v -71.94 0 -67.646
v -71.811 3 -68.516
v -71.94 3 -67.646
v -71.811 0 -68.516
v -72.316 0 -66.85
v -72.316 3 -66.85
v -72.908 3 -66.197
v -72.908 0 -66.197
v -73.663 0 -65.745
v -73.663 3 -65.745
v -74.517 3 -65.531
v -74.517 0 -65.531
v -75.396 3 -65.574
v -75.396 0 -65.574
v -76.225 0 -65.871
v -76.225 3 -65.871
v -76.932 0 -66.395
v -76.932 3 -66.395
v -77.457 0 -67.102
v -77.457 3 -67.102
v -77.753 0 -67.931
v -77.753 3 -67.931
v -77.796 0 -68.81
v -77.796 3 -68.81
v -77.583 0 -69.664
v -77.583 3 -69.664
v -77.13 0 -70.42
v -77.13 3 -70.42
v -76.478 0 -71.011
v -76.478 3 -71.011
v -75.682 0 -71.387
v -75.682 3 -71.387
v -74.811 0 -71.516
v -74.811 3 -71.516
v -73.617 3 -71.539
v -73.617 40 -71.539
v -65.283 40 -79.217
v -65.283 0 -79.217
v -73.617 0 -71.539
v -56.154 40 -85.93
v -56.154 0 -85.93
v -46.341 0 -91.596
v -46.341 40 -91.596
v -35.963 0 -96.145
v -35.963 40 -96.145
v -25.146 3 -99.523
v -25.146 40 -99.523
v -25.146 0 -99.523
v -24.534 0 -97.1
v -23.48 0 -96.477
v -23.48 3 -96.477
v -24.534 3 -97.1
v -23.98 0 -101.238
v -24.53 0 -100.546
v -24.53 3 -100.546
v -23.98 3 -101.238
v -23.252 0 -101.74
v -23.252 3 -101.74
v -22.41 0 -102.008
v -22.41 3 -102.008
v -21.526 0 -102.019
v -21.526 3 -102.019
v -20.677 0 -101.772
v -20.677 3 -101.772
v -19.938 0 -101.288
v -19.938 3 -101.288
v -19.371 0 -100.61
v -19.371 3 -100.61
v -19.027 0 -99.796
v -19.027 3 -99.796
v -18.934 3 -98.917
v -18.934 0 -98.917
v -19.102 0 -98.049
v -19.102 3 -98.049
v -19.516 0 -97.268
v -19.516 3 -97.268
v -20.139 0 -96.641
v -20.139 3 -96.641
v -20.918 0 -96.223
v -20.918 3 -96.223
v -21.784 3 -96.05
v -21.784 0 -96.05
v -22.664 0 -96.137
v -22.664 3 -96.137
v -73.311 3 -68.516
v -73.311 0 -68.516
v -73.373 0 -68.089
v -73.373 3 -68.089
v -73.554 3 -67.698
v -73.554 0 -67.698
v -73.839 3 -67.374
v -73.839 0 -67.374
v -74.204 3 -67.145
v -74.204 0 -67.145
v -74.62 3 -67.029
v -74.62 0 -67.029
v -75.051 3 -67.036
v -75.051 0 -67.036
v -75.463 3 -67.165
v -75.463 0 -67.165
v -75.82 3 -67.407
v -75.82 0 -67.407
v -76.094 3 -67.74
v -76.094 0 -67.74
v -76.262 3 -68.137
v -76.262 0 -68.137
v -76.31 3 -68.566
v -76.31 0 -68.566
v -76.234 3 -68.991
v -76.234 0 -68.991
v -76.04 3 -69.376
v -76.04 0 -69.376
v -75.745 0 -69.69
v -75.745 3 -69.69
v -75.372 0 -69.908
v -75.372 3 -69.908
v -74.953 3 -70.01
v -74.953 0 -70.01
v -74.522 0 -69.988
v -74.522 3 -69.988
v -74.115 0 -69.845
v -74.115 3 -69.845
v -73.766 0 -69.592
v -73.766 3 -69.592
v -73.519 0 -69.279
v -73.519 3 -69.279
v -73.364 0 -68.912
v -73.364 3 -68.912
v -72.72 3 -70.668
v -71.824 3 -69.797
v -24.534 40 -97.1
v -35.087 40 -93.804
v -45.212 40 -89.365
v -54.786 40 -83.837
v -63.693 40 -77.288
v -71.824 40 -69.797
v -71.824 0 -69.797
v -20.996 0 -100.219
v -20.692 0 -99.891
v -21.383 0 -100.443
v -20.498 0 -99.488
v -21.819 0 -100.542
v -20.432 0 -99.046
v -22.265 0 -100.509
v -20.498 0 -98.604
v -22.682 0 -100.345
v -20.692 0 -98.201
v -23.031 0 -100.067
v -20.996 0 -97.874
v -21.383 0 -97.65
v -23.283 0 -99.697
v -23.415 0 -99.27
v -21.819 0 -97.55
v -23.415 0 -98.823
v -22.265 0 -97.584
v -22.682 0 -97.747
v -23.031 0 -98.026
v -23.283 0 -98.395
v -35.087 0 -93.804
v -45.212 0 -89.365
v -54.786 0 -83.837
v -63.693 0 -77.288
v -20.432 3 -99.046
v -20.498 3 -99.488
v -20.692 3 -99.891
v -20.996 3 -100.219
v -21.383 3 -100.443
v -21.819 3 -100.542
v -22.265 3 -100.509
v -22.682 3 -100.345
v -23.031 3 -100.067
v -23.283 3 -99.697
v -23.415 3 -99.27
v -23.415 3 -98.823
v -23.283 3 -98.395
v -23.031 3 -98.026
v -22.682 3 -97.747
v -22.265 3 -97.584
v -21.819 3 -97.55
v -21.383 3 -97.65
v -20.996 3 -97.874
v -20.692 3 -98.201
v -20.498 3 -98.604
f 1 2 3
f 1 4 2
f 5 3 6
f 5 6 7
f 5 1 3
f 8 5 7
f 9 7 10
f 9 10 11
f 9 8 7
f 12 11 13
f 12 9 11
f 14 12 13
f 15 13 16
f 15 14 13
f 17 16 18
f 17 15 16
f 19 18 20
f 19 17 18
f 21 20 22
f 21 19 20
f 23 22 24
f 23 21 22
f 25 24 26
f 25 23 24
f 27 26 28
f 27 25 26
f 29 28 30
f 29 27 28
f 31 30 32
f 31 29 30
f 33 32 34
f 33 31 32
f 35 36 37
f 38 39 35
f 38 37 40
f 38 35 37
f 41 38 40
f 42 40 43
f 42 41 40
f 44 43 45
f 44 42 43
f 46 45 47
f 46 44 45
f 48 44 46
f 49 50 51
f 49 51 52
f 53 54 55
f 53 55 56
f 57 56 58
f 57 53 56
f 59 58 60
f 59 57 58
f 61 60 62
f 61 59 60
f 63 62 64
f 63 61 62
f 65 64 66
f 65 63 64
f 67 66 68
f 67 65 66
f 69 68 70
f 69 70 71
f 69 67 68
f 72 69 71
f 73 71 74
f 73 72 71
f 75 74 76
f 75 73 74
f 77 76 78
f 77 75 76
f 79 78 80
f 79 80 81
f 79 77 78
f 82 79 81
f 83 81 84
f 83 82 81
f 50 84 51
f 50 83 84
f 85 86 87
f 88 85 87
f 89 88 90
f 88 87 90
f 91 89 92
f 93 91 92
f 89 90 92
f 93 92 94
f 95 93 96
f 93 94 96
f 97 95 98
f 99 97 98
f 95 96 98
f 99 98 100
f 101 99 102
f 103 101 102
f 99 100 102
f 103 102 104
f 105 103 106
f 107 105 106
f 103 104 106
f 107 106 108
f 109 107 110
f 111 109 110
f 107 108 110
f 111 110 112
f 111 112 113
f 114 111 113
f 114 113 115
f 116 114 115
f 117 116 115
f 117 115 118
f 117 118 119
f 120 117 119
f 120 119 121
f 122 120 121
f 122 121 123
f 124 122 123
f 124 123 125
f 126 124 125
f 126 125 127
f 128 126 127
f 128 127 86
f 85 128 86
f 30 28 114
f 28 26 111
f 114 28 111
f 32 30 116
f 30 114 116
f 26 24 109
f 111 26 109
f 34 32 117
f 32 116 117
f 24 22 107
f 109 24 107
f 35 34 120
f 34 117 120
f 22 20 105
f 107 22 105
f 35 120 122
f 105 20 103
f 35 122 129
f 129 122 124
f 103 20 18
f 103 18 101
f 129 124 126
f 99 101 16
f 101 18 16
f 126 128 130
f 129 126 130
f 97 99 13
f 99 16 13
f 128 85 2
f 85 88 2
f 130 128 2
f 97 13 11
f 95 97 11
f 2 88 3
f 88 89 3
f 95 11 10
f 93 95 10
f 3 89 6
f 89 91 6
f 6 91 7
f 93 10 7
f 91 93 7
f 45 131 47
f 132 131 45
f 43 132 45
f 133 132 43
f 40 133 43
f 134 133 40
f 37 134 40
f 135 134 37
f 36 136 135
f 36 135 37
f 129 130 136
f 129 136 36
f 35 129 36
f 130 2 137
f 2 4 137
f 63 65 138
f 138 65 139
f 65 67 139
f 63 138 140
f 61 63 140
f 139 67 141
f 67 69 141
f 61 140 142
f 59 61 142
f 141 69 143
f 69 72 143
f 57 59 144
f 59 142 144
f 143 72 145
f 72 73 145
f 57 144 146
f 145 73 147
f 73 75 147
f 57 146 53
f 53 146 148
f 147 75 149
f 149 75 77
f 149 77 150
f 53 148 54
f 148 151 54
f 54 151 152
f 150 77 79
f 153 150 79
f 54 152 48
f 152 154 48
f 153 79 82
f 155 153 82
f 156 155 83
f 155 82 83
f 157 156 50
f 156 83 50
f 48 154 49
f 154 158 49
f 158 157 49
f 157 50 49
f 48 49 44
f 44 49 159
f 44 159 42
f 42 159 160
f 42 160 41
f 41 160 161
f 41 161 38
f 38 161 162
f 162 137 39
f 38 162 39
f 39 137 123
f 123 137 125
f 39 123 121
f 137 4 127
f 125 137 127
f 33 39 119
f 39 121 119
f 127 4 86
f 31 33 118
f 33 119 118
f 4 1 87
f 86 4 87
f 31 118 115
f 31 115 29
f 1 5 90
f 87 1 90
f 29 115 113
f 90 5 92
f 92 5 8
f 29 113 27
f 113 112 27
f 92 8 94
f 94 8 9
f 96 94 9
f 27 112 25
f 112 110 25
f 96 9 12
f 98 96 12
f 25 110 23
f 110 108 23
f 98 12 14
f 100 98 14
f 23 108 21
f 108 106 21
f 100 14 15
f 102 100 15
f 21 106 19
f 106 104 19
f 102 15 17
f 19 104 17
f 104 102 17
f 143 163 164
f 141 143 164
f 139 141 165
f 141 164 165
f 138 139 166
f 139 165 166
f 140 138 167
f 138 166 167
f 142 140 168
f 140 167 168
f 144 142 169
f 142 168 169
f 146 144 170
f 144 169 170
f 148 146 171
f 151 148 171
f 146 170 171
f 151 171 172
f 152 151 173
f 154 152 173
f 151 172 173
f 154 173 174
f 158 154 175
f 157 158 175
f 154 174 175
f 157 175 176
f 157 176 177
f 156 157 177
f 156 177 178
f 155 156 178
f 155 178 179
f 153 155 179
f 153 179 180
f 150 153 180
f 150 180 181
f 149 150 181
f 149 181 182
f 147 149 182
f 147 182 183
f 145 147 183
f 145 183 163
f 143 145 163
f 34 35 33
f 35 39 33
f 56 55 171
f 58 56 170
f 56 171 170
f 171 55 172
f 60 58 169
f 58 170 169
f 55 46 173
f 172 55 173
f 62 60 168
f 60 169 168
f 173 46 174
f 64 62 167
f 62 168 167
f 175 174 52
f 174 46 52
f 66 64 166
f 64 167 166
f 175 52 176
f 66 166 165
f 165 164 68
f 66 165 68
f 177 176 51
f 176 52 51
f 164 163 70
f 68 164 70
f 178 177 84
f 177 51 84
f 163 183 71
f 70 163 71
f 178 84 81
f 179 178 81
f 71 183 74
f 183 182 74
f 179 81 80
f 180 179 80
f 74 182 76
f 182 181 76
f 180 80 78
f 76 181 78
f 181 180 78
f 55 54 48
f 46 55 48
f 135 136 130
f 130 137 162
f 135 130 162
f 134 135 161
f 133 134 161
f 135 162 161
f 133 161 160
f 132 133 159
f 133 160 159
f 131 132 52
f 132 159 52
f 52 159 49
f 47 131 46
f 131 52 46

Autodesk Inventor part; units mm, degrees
ref_plane "YZ Plane" through (0, 0, 0) normal (1, 0, 0) x (0, 1, 0)
ref_plane "XZ Plane" through (0, 0, 0) normal (0, 1, 0) x (-1, 0, 0)
ref_plane "XY Plane" through (0, 0, 0) normal (0, 0, 1) x (1, 0, 0)
sketch "Sketch1" plane through (0, 0, 0) normal (0, 1, 0) x (-1, 0, 0)
  circle A0 centre (0, 0) radius 100.151
  line L0 (0, 0) -> (50.0755, -86.7333)
  line L1 (0, 0) -> (100.151, 0) construction
  line L2 (0, 0) -> (50.0755, 86.7333)
  line L3 (0, 0) -> (100.151, 0) construction
  line L4 (0, 0) -> (-100.151, 0)
  line L5 (50.0755, -86.7333) -> (100.0755, -86.7333) construction
  line L6 (50.0755, -86.7333) -> (24.5339, -97.0995)
  line L7 (50.0755, -86.7333) -> (100.0755, -86.7333) construction
  line L8 (71.8237, -69.7967) -> (50.0755, -86.7333)
  circle A1 centre (0, 0) radius 102.651
  line L9 (0, 0) -> (71.8237, -69.7967)
  line L10 (71.8237, -69.7967) -> (73.6166, -71.539)
  line L11 (0, 0) -> (24.5339, -97.0995)
  line L12 (24.5339, -97.0995) -> (25.1463, -99.5233)
  dimension "d0" = 200.302
  dimension "d1" = 60
  dimension "d2" = 60
  dimension "d8" = 205.302
extrude "Extrusion1" add sketch "Sketch1" along normal blind 40 contours L10 A1 L12 A0 picked at (67.2642, -76.2102)
sketch "Sketch2" plane through (0, 0, 0) normal (0, -1, 0) x (1, 0, 0)
  line L0 (-24.5339, -97.0995) -> (-25.1463, -99.5233) projected
  line L1 (-24.8401, -98.3114) -> (-21.9315, -99.0463)
  circle A0 centre (-21.9315, -99.0463) radius 1.5
  line L2 (-73.6166, -71.539) -> (-71.8237, -69.7967) projected
  line L3 (-72.7201, -70.6679) -> (-74.8716, -72.7586)
  line L4 (-74.8716, -72.7586) -> (-72.7201, -70.6679)
  line L5 (-72.7201, -70.6679) -> (-74.8109, -68.5164)
  circle A1 centre (-74.8109, -68.5164) radius 1.5
  circle A2 centre (-74.8109, -68.5164) radius 3
  arc A3 (-73.6166, -71.539) -> (-25.1463, -99.5233) centre (0, 0) ccw projected
  line L6 (-73.6166, -71.539) -> (-74.8109, -71.5164)
  arc A4 (-71.8237, -69.7967) -> (-24.5339, -97.0995) centre (0, 0) ccw projected
  line L7 (-71.8109, -68.5164) -> (-71.8237, -69.7967)
  circle A5 centre (-21.9315, -99.0463) radius 3
  line L8 (-21.9315, -99.0463) -> (-24.5296, -100.5463)
  line L9 (-21.9315, -99.0463) -> (-18.9315, -99.0463) construction
  line L10 (-24.5296, -100.5463) -> (-25.1463, -99.5233)
  arc A6 (-22.1585, -98.9889) -> (-21.9315, -99.0463) centre (-21.9315, -98.5684) ccw
  line L11 (-21.9315, -99.0463) -> (-22.9003, -97.4384)
  line L12 (-21.9315, -99.0463) -> (-20.0543, -99.0463) construction
  line L13 (-22.9003, -97.4384) -> (-23.4798, -96.4767)
  line L14 (-23.4798, -96.4767) -> (-24.5339, -97.0995)
  point P0 (0, 0)
  dimension "d12" = 3
  dimension "d13" = 3
  dimension "d14" = 3
  dimension "d15" = 210
  dimension "d16" = 121.07
extrude "Extrusion2" add sketch "Sketch2" against normal blind 3 contours L14 A5 L0 | L7 L2 A2 | A5 L10 L0 | A5 L13 L11 A0 L1 | L1 A0 L8 A5 | A5 L8 A0 L11 L13 | A0 L11 L1 | L1 A6 L8 A0 | L2 L6 A2 | A2 | L1 A6 | A0 L8 L11
sketch "Sketch3" plane through (0, 3, 0) normal (0, 1, 0) x (1, 0, 0)
  arc A0 (-23.4798, 96.4767) -> (-24.5296, 100.5463) centre (-21.9315, 99.0463) ccw projected
  circle A1 centre (-21.9315, 99.0463) radius 1.5
  point P0 (0, 0)
  dimension "d19" = 3
extrude "Extrusion3" cut sketch "Sketch3" against normal blind 3
properties part number "Wheel Guard"
